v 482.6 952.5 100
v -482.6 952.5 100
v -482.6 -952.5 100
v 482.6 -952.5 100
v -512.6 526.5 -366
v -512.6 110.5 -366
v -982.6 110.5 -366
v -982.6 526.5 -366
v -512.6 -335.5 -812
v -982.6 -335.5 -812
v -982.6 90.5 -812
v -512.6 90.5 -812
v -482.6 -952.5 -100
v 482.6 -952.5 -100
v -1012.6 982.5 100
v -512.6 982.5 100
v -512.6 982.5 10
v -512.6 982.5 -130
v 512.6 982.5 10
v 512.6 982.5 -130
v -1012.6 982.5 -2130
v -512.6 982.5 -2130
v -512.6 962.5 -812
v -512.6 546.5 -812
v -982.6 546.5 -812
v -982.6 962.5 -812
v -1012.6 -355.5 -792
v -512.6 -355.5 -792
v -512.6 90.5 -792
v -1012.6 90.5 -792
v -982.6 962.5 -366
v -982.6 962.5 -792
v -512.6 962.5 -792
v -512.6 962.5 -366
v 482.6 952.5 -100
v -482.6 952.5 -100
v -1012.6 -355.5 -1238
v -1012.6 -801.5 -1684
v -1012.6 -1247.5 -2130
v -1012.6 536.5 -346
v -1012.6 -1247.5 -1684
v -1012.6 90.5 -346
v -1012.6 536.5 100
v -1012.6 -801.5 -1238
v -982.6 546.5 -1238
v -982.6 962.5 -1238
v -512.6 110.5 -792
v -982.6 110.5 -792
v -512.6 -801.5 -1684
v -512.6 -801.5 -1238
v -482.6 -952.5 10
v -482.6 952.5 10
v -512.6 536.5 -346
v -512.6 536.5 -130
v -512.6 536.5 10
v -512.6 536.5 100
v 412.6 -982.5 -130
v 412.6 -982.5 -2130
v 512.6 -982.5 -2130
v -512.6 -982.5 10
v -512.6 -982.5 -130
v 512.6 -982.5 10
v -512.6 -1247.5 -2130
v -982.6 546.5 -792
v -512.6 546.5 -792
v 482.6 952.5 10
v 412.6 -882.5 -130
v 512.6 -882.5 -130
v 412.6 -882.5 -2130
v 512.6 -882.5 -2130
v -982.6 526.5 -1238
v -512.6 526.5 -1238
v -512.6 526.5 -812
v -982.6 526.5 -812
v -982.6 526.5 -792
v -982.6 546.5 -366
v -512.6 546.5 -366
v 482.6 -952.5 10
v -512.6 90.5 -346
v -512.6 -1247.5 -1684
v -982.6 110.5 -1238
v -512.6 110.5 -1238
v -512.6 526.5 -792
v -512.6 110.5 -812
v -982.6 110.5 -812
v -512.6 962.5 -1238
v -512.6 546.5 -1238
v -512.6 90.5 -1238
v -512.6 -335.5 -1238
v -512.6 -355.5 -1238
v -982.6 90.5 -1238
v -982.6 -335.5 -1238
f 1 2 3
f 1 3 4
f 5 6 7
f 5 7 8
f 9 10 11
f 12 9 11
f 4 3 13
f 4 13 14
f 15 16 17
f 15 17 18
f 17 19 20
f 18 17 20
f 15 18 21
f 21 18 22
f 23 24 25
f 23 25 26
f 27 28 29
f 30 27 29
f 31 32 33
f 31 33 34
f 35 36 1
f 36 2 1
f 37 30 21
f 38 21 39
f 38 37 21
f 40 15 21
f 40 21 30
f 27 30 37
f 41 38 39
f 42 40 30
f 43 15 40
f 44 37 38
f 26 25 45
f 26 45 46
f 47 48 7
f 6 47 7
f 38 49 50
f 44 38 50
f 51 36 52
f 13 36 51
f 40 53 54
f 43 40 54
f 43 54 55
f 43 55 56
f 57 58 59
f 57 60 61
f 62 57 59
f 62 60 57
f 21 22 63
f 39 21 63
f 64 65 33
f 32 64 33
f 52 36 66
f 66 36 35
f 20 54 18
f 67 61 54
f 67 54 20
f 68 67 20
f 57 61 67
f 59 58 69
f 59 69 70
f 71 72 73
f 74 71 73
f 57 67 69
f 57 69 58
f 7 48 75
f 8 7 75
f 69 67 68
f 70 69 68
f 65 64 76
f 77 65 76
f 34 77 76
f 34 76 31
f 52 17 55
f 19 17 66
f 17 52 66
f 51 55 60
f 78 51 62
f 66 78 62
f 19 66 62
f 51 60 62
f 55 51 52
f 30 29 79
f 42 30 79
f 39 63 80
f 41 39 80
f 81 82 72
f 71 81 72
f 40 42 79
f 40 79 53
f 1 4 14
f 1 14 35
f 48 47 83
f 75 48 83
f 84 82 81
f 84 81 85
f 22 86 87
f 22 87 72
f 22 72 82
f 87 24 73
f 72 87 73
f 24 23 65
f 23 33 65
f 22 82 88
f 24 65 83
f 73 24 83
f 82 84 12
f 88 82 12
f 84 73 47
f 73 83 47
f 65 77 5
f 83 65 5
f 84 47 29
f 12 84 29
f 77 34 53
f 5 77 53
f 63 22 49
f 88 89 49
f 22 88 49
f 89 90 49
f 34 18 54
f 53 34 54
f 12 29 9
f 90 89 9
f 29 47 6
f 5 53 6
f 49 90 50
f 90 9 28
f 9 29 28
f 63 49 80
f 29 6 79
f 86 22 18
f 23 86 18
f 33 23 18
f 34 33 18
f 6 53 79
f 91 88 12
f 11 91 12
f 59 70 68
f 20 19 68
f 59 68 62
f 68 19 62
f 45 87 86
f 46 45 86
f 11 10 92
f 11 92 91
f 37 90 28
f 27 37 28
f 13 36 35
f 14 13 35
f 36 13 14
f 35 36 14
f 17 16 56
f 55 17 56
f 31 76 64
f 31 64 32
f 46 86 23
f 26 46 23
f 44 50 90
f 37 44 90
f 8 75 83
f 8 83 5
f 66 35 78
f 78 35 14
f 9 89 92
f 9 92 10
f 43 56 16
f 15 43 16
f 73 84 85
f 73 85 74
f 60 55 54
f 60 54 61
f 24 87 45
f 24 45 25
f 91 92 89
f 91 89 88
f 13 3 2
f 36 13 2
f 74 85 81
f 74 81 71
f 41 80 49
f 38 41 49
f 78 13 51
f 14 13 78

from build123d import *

# Parameters (mm, degrees)
F0_W      = 965.2
F0_H      = 1905
F1_DEPTH  = 100
F2_W      = 1025.2
F2_H      = 1965
F2_W_2    = 965.2
F2_H_2    = 1905
F3_DEPTH  = 110
F4_W      = 1025.2
F4_H      = 1965
F5_DEPTH  = 30
F7_DEPTH  = 500
F8_W      = 100
F8_H      = 100
F9_DEPTH  = 2000
F10_W     = 416
F10_H     = 426
F10_W_2   = 426
F11_DEPTH = 470


with BuildPart() as f1:
    # F0 (on Top) → F1 (new body, symmetric)
    with BuildSketch(Plane.XY):
        Rectangle(F0_W, F0_H)
    extrude(amount=F1_DEPTH, both=True)


with BuildPart() as f3:
    # F2 (on face) → F3 (new body)
    with BuildSketch(Plane(origin=(0, 0, -100), x_dir=(1, 0, 0), z_dir=(0, 0, -1))):
        Rectangle(F2_W, F2_H)
        Rectangle(F2_W_2, F2_H_2, mode=Mode.SUBTRACT)
    extrude(amount=-F3_DEPTH)



with BuildPart() as f5:
    # F4 (on face) → F5 (new body)
    with BuildSketch(Plane(origin=(0, 0, -100), x_dir=(1, 0, 0), z_dir=(0, 0, -1))):
        Rectangle(F4_W, F4_H)
    extrude(amount=F5_DEPTH)


with BuildPart() as f3_1:
    add(f3.part)

    add(f5.part)  # F7 merges F5
    # F6 (on face) → F7 (join)
    with BuildSketch(Plane(origin=(-512.6, 0, 0), x_dir=(0, -1, 0), z_dir=(-1, 0, 0))):
        Polygon((-536.5, 100), (-982.5, 100), (-982.5, -2130), (1247.5, -2130), (1247.5, -1684), (801.5, -1684), (801.5, -1238), (355.5, -1238), (355.5, -792), (-90.5, -792), (-90.5, -346), (-536.5, -346), align=None)
    extrude(amount=F7_DEPTH)

    # F8 (on face) → F9 (join, through all)
    with BuildSketch(Plane(origin=(0, 0, -130), x_dir=(1, 0, 0), z_dir=(0, 0, -1))):
        with Locations((462.6, 932.5)):
            Rectangle(F8_W, F8_H)
    extrude(amount=F9_DEPTH)

    # F10 (on face) → F11 (cut)
    with BuildSketch(Plane.YZ.offset(-512.6)):
        with Locations((318.5, -579)):
            Rectangle(F10_W, F10_H)
        with Locations((-122.5, -1025)):
            Rectangle(F10_W_2, F10_H)
        with Locations((318.5, -1025)):
            Rectangle(F10_W, F10_H)
        with Locations((754.5, -579)):
            Rectangle(F10_W, F10_H)
        with Locations((754.5, -1025)):
            Rectangle(F10_W, F10_H)
    extrude(amount=-F11_DEPTH, mode=Mode.SUBTRACT)


solid = Compound([f1.part, f3_1.part])
